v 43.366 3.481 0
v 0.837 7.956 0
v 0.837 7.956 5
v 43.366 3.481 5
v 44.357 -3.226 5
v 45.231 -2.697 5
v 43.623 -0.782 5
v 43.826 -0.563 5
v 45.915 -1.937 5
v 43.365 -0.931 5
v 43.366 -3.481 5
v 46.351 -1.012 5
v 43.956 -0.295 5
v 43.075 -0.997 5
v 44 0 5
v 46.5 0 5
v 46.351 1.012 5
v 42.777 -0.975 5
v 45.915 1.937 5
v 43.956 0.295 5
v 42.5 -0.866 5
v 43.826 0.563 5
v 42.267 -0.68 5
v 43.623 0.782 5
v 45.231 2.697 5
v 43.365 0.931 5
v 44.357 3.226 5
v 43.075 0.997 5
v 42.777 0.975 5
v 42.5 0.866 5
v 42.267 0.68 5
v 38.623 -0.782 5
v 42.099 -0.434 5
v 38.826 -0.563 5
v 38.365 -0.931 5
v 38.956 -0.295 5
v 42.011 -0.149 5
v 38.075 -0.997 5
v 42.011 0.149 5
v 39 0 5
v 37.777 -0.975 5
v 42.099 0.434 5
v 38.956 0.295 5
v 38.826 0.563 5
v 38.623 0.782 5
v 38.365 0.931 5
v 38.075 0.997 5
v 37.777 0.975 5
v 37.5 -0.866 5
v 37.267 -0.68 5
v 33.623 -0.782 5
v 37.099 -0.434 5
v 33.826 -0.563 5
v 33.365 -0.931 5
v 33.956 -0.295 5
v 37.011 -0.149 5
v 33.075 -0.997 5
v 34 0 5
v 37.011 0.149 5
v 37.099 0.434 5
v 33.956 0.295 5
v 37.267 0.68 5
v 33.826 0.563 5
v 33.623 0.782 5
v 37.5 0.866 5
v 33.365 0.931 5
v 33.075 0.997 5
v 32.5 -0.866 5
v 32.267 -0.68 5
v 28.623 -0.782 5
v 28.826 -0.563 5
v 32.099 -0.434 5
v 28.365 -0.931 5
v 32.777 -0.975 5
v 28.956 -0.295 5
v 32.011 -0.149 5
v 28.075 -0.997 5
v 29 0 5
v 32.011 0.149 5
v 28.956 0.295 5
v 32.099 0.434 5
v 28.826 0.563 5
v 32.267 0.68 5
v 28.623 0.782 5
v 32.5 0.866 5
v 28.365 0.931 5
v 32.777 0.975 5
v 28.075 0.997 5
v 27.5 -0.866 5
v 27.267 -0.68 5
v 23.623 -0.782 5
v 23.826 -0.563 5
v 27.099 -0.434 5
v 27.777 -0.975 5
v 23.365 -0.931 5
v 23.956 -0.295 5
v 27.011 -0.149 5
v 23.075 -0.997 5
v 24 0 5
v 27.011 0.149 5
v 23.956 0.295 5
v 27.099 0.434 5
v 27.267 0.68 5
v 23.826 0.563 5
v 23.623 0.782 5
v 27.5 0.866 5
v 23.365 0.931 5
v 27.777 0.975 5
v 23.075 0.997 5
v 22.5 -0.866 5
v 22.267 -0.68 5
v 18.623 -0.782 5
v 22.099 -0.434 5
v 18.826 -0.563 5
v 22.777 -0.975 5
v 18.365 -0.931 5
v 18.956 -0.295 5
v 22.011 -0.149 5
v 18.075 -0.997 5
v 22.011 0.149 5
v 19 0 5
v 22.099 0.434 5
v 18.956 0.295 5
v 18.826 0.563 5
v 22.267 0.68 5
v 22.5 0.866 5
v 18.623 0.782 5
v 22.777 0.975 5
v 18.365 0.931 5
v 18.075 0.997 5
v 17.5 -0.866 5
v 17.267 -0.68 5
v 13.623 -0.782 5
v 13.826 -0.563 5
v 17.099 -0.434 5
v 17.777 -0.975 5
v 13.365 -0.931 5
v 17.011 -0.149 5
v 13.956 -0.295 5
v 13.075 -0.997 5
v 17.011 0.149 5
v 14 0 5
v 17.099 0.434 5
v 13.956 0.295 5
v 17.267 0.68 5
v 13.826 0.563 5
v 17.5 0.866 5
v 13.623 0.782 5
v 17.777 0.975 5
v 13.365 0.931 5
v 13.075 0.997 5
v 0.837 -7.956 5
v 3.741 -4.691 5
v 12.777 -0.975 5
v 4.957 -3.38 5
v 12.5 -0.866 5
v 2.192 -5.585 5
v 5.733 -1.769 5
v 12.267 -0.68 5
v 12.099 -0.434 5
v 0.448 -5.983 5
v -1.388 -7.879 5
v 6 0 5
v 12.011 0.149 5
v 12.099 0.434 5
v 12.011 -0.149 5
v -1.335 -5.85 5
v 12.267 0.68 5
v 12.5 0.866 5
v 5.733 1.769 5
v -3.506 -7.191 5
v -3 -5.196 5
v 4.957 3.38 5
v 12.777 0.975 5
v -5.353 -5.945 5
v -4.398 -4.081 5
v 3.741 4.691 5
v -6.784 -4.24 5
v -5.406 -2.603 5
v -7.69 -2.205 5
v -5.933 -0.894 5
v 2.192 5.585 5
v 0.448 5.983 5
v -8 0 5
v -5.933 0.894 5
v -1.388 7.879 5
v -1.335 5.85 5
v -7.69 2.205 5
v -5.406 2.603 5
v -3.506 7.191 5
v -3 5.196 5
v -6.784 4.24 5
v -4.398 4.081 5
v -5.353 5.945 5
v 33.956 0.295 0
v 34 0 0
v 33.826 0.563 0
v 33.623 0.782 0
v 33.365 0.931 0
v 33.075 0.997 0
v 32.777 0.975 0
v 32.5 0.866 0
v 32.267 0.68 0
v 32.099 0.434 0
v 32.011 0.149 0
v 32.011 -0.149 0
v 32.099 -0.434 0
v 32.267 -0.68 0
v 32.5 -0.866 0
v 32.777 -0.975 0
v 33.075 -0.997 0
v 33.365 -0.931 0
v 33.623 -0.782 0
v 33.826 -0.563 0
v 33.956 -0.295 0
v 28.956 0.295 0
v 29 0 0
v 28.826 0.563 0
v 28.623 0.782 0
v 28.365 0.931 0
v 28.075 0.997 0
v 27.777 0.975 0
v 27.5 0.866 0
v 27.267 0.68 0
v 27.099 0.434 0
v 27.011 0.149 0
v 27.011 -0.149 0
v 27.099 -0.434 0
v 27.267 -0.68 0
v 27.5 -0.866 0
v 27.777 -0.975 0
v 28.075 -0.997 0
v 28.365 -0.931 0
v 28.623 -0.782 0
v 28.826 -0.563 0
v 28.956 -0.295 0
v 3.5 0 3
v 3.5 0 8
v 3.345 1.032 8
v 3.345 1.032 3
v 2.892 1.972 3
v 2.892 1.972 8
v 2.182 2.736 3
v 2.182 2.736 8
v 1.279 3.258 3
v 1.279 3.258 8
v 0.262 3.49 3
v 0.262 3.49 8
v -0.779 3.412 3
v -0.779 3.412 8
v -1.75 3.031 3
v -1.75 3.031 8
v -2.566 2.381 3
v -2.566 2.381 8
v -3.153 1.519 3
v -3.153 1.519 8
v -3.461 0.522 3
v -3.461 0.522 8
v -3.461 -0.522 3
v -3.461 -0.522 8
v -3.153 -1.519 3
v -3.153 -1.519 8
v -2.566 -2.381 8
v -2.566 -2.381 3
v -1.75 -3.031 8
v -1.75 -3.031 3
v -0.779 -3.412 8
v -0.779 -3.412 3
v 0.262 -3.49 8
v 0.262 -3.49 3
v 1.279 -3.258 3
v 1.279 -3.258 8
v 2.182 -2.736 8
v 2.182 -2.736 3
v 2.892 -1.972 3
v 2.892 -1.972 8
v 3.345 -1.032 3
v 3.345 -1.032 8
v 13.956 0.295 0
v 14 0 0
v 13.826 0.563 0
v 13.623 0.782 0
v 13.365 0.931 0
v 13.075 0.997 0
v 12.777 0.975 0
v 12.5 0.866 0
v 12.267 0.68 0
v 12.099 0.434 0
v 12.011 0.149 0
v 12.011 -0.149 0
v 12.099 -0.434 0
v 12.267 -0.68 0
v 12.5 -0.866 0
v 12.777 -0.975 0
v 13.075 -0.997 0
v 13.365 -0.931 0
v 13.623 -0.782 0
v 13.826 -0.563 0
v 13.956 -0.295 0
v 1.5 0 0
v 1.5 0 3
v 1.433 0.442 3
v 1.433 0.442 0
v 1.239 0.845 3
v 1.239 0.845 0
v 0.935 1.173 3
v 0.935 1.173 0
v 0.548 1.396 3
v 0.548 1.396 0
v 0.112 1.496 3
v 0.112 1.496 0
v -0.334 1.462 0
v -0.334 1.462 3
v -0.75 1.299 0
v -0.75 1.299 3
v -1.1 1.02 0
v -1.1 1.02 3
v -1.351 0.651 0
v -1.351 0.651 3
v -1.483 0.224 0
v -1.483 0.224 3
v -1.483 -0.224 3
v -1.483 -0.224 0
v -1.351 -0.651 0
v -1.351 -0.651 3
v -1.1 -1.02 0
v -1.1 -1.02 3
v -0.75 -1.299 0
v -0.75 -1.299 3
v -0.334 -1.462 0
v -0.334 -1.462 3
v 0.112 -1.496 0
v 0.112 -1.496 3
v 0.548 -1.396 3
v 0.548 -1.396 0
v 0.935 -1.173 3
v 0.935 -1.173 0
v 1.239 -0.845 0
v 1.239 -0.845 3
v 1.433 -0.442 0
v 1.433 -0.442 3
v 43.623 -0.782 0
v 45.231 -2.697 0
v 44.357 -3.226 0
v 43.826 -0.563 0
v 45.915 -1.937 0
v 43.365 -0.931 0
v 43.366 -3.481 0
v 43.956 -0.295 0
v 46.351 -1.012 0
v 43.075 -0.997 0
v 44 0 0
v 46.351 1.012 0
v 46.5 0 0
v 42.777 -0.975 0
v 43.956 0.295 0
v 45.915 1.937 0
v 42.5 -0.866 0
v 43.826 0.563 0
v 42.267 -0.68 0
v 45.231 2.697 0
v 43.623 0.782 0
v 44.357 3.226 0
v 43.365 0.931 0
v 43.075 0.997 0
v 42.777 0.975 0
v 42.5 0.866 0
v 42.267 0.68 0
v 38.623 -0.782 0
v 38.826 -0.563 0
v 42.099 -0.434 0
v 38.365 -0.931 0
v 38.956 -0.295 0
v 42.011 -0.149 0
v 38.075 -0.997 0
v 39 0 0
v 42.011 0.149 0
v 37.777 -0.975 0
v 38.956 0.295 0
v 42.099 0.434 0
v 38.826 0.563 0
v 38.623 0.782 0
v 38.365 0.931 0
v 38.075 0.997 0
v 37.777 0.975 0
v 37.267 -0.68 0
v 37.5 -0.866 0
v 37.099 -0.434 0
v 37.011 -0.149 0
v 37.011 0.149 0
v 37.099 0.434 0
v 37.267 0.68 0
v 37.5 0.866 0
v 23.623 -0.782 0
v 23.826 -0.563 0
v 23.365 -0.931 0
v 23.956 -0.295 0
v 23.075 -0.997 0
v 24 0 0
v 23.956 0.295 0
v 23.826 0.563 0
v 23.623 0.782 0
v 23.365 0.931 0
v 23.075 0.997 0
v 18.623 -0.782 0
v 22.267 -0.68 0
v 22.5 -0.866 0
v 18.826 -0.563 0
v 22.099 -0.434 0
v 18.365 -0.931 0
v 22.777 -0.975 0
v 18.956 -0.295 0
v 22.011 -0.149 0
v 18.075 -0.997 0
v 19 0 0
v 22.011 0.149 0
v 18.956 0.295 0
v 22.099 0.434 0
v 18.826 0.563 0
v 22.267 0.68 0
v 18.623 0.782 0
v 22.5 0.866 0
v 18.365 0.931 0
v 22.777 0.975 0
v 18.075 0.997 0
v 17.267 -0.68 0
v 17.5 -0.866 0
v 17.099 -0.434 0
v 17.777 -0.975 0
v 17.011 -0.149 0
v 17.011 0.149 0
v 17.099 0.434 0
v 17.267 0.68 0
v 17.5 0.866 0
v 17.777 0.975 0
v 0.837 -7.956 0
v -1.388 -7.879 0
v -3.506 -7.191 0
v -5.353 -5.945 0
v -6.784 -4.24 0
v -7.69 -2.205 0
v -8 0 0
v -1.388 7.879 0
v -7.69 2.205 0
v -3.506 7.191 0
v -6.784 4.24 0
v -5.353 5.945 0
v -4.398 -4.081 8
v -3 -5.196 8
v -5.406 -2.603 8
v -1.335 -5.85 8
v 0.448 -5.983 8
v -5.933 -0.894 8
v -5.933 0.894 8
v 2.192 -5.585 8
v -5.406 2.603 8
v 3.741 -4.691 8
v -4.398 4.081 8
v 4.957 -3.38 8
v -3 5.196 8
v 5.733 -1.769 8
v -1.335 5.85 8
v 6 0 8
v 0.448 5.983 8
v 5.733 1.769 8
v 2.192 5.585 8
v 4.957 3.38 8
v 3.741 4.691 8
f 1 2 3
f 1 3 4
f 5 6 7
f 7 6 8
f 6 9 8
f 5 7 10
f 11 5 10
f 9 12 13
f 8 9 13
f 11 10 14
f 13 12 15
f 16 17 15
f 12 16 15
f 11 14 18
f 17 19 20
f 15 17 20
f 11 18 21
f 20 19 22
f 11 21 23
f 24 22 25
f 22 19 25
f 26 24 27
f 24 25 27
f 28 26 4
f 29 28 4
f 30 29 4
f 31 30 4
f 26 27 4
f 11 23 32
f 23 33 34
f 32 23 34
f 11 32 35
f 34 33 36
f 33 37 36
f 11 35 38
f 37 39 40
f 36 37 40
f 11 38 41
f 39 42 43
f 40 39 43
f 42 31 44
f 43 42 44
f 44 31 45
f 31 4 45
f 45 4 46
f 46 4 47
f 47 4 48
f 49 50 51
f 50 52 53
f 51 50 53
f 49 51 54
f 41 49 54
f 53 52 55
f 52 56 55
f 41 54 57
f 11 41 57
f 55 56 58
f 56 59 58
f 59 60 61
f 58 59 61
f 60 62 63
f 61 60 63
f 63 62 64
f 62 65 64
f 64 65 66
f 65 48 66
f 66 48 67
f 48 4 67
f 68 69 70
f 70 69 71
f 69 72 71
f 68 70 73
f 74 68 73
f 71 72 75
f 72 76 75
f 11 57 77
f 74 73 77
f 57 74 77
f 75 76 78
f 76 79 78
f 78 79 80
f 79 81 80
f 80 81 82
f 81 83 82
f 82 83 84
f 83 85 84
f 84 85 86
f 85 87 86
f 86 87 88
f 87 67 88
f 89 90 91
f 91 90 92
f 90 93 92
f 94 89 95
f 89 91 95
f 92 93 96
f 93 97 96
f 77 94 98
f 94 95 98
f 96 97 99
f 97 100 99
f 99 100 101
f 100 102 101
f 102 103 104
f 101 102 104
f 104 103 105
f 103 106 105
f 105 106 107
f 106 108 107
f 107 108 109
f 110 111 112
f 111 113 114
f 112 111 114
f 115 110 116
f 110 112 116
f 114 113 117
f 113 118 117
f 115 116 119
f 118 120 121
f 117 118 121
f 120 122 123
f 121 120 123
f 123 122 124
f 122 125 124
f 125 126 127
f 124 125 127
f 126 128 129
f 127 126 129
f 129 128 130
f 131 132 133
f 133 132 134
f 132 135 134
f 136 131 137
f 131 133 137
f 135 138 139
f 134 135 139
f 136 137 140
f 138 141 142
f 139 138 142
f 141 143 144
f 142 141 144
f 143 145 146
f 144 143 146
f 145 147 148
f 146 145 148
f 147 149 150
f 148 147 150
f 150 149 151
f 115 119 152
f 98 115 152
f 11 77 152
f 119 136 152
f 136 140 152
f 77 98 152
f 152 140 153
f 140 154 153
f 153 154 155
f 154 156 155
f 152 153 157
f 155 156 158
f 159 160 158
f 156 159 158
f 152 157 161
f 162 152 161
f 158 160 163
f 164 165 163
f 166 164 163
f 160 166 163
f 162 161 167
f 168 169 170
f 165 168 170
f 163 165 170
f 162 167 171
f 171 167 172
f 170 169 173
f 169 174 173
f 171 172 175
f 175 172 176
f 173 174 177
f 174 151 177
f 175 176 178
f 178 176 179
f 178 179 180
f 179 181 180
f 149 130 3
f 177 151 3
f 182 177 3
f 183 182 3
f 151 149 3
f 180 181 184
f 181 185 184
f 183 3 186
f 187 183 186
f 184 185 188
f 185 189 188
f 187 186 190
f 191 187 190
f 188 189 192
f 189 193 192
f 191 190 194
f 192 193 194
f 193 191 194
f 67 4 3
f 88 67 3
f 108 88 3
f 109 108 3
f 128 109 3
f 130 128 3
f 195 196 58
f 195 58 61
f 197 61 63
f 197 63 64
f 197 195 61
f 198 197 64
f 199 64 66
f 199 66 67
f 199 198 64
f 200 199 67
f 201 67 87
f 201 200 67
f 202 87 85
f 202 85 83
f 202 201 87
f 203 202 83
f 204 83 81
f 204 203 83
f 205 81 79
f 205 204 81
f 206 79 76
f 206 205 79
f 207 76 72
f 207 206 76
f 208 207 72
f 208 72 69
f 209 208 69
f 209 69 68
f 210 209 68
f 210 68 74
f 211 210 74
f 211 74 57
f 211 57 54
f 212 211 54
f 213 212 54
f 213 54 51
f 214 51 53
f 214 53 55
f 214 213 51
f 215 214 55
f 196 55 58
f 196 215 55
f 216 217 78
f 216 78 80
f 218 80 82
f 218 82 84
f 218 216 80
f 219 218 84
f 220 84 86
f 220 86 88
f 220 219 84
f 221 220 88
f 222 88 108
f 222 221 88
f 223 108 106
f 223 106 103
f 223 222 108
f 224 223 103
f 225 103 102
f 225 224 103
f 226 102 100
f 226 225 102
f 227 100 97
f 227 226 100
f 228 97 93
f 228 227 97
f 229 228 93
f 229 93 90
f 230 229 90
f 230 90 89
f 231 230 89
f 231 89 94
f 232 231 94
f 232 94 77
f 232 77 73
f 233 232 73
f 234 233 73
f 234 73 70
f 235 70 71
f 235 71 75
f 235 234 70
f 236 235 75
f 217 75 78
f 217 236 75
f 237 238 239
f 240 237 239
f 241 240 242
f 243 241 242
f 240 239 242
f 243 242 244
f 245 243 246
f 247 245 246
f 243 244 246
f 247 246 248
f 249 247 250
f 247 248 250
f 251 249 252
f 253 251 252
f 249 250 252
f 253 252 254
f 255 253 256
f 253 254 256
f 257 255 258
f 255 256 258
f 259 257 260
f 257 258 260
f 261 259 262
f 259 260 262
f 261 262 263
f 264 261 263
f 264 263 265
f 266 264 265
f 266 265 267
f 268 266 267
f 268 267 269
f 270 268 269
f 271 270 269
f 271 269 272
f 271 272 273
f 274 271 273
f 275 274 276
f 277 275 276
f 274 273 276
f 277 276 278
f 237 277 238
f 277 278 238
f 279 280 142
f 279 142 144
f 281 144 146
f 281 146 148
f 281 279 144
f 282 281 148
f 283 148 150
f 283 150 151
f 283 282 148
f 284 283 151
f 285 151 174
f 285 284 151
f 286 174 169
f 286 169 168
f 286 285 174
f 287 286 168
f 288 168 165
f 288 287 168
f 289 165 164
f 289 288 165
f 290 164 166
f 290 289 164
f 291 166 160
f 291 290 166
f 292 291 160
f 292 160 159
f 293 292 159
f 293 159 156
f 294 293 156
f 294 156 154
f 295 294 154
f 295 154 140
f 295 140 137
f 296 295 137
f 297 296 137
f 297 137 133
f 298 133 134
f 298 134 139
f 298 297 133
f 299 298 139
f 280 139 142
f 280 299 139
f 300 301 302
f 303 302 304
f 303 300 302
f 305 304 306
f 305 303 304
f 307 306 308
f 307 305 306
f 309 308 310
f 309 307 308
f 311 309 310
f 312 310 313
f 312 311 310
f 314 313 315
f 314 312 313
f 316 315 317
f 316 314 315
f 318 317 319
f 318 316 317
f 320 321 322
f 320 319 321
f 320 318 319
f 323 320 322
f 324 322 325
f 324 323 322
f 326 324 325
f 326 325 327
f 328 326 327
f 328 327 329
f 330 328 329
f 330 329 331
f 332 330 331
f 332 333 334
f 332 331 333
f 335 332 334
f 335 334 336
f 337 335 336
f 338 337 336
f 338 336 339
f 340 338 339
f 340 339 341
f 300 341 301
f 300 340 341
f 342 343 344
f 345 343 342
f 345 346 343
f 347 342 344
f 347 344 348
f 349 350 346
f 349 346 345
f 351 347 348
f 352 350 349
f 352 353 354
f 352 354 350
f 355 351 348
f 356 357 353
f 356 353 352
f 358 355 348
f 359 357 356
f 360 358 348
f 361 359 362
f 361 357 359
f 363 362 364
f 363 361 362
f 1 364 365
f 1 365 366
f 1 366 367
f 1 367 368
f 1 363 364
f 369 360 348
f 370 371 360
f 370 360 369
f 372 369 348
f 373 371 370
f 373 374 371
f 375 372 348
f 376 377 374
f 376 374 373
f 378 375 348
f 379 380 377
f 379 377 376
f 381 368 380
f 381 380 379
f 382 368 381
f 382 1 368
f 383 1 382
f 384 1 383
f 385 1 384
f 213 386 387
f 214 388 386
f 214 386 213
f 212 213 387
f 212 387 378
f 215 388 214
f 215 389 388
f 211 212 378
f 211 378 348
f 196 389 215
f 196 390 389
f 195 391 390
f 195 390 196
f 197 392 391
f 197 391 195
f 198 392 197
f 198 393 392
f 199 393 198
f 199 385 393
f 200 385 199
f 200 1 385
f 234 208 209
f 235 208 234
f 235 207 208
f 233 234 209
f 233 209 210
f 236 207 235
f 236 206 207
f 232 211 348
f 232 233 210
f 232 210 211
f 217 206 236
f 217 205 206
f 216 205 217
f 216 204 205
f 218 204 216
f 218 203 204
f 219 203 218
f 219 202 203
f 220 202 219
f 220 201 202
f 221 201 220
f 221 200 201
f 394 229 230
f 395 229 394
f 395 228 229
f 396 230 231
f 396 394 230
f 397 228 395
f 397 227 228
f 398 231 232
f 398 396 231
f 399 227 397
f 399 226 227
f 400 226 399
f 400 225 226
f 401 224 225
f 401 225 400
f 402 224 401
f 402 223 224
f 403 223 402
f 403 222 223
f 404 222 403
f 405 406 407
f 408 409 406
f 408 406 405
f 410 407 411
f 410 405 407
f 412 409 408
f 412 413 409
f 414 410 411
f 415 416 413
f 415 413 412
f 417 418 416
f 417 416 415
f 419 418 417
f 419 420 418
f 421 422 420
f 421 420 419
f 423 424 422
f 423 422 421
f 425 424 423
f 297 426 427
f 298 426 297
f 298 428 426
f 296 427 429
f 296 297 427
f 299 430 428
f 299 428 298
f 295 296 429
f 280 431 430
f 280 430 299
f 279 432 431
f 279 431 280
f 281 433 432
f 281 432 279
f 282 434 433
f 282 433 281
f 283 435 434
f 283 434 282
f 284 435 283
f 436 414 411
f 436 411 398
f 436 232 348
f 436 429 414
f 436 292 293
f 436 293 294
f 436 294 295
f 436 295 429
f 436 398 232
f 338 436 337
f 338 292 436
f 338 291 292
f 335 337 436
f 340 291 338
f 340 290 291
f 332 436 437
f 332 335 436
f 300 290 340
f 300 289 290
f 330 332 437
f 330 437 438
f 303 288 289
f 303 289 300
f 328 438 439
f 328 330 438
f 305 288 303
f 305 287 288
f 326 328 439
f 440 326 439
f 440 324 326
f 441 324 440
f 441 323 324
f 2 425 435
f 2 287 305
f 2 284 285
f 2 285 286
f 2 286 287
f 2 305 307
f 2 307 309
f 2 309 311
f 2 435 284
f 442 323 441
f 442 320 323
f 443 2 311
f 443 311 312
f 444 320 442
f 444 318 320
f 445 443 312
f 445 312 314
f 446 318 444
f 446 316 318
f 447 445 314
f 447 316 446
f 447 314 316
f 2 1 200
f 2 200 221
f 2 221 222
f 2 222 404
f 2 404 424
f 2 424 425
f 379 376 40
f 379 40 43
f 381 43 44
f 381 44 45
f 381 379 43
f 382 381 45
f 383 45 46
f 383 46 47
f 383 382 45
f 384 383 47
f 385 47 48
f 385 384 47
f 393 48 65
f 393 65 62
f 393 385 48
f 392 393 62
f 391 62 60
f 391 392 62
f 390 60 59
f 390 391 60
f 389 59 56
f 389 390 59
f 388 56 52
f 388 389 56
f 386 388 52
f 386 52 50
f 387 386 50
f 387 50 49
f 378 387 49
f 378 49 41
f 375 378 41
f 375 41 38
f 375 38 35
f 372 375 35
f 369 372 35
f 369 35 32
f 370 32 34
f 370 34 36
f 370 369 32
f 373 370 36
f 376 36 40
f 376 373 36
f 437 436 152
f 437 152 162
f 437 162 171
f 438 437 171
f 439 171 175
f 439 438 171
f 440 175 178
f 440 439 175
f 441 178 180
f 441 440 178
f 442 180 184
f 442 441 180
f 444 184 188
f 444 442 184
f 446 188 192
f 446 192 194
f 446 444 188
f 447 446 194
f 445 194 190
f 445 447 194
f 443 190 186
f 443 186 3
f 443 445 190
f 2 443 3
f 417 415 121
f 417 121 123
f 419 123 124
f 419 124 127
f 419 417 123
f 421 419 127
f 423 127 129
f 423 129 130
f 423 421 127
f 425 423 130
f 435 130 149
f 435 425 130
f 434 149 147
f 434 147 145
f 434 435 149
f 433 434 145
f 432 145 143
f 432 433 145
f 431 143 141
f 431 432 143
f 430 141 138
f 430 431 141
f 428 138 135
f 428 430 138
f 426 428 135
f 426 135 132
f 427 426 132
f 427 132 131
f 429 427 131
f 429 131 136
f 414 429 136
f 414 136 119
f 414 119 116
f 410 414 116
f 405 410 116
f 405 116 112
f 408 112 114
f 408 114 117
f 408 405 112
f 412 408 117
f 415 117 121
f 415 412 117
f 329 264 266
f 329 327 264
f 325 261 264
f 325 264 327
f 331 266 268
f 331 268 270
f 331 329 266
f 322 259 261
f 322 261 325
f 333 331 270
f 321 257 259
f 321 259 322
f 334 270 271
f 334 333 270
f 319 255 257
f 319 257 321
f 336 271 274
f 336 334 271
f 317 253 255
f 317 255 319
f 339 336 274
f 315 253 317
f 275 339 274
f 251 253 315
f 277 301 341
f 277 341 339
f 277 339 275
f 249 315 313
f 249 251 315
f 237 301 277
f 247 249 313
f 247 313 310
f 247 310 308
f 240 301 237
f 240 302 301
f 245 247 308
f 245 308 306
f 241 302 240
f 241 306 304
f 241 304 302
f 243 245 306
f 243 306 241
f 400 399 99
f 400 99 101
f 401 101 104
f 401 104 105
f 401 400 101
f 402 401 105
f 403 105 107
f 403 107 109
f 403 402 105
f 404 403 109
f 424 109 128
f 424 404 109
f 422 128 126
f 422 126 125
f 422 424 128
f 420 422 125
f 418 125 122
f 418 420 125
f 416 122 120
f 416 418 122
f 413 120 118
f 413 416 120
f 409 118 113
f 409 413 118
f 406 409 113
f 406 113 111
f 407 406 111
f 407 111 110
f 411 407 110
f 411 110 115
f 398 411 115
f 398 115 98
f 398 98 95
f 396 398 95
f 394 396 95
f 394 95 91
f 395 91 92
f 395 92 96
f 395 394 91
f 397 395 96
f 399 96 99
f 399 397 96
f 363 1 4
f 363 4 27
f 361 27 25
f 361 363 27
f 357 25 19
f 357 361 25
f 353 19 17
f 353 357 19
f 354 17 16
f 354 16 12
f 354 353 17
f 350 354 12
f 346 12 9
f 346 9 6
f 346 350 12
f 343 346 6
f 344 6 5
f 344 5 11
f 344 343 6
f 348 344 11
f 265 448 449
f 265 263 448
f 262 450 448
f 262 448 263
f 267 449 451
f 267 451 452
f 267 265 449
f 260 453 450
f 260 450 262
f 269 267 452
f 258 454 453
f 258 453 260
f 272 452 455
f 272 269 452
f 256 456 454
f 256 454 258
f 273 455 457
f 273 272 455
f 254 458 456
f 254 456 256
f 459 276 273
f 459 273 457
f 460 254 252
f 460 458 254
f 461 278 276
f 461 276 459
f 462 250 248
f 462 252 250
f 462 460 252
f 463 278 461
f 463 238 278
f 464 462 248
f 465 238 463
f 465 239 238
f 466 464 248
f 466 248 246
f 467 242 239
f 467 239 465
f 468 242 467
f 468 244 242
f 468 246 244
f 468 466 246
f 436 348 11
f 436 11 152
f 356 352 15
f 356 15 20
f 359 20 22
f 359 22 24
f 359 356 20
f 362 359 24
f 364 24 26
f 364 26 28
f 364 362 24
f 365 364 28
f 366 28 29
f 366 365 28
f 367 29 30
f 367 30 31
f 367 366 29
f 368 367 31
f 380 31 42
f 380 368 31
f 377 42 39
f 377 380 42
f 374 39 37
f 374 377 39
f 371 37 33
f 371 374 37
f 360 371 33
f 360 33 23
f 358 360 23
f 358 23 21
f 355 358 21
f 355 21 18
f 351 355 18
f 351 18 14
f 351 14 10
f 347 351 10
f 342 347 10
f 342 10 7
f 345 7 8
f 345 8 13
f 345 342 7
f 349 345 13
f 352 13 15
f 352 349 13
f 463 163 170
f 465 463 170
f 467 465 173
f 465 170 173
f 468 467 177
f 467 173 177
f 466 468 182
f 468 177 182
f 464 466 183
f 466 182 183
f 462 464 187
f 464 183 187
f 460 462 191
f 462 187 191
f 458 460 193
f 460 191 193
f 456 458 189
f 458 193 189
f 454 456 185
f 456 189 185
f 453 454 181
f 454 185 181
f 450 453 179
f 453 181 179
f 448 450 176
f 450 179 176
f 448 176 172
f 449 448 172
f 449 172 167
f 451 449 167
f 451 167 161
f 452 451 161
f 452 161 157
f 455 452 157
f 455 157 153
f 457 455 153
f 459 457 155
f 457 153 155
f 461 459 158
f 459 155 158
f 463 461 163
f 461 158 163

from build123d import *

# Parameters (mm, degrees)
ESQUISSE1_R             = 1
ESQUISSE1_R_2           = 1.5
BOSS_EXTRU_1_DEPTH      = 5
ESQUISSE2_R             = 6
BOSS_EXTRU_2_DEPTH      = 3
ESQUISSE3_R             = 3.5
ENL_V_MAT_EXTRU_1_DEPTH = 5


with BuildPart() as part:
    # Esquisse1 → Boss.-Extru.1 (new body)
    with BuildSketch(Plane.XY):
        with BuildLine():
            Line((0.837209302, 7.956071932), (43.36627907, 3.48078147))
            ThreePointArc((43.36627907, 3.48078147), (46.5, 0), (43.36627907, -3.48078147))
            Line((43.36627907, -3.48078147), (0.837209302, -7.956071932))
            ThreePointArc((0.837209302, -7.956071932), (-8, 0), (0.837209302, 7.956071932))
        make_face()
        with Locations((43, 0)):
            Circle(ESQUISSE1_R, mode=Mode.SUBTRACT)
        Circle(ESQUISSE1_R_2, mode=Mode.SUBTRACT)
        with Locations((38, 0)):
            Circle(ESQUISSE1_R, mode=Mode.SUBTRACT)
        with Locations((33, 0)):
            Circle(ESQUISSE1_R, mode=Mode.SUBTRACT)
        with Locations((28, 0)):
            Circle(ESQUISSE1_R, mode=Mode.SUBTRACT)
        with Locations((23, 0)):
            Circle(ESQUISSE1_R, mode=Mode.SUBTRACT)
        with Locations((18, 0)):
            Circle(ESQUISSE1_R, mode=Mode.SUBTRACT)
        with Locations((13, 0)):
            Circle(ESQUISSE1_R, mode=Mode.SUBTRACT)
    extrude(amount=BOSS_EXTRU_1_DEPTH)

    # Esquisse2 → Boss.-Extru.2 (add)
    with BuildSketch(Plane.XY.offset(5)):
        Circle(ESQUISSE2_R)
    extrude(amount=BOSS_EXTRU_2_DEPTH)

    # Esquisse3 → Enlèv. mat.-Extru.1 (cut)
    with BuildSketch(Plane.XY.offset(8)):
        Circle(ESQUISSE3_R)
    extrude(amount=-ENL_V_MAT_EXTRU_1_DEPTH, mode=Mode.SUBTRACT)


solid = part.part
